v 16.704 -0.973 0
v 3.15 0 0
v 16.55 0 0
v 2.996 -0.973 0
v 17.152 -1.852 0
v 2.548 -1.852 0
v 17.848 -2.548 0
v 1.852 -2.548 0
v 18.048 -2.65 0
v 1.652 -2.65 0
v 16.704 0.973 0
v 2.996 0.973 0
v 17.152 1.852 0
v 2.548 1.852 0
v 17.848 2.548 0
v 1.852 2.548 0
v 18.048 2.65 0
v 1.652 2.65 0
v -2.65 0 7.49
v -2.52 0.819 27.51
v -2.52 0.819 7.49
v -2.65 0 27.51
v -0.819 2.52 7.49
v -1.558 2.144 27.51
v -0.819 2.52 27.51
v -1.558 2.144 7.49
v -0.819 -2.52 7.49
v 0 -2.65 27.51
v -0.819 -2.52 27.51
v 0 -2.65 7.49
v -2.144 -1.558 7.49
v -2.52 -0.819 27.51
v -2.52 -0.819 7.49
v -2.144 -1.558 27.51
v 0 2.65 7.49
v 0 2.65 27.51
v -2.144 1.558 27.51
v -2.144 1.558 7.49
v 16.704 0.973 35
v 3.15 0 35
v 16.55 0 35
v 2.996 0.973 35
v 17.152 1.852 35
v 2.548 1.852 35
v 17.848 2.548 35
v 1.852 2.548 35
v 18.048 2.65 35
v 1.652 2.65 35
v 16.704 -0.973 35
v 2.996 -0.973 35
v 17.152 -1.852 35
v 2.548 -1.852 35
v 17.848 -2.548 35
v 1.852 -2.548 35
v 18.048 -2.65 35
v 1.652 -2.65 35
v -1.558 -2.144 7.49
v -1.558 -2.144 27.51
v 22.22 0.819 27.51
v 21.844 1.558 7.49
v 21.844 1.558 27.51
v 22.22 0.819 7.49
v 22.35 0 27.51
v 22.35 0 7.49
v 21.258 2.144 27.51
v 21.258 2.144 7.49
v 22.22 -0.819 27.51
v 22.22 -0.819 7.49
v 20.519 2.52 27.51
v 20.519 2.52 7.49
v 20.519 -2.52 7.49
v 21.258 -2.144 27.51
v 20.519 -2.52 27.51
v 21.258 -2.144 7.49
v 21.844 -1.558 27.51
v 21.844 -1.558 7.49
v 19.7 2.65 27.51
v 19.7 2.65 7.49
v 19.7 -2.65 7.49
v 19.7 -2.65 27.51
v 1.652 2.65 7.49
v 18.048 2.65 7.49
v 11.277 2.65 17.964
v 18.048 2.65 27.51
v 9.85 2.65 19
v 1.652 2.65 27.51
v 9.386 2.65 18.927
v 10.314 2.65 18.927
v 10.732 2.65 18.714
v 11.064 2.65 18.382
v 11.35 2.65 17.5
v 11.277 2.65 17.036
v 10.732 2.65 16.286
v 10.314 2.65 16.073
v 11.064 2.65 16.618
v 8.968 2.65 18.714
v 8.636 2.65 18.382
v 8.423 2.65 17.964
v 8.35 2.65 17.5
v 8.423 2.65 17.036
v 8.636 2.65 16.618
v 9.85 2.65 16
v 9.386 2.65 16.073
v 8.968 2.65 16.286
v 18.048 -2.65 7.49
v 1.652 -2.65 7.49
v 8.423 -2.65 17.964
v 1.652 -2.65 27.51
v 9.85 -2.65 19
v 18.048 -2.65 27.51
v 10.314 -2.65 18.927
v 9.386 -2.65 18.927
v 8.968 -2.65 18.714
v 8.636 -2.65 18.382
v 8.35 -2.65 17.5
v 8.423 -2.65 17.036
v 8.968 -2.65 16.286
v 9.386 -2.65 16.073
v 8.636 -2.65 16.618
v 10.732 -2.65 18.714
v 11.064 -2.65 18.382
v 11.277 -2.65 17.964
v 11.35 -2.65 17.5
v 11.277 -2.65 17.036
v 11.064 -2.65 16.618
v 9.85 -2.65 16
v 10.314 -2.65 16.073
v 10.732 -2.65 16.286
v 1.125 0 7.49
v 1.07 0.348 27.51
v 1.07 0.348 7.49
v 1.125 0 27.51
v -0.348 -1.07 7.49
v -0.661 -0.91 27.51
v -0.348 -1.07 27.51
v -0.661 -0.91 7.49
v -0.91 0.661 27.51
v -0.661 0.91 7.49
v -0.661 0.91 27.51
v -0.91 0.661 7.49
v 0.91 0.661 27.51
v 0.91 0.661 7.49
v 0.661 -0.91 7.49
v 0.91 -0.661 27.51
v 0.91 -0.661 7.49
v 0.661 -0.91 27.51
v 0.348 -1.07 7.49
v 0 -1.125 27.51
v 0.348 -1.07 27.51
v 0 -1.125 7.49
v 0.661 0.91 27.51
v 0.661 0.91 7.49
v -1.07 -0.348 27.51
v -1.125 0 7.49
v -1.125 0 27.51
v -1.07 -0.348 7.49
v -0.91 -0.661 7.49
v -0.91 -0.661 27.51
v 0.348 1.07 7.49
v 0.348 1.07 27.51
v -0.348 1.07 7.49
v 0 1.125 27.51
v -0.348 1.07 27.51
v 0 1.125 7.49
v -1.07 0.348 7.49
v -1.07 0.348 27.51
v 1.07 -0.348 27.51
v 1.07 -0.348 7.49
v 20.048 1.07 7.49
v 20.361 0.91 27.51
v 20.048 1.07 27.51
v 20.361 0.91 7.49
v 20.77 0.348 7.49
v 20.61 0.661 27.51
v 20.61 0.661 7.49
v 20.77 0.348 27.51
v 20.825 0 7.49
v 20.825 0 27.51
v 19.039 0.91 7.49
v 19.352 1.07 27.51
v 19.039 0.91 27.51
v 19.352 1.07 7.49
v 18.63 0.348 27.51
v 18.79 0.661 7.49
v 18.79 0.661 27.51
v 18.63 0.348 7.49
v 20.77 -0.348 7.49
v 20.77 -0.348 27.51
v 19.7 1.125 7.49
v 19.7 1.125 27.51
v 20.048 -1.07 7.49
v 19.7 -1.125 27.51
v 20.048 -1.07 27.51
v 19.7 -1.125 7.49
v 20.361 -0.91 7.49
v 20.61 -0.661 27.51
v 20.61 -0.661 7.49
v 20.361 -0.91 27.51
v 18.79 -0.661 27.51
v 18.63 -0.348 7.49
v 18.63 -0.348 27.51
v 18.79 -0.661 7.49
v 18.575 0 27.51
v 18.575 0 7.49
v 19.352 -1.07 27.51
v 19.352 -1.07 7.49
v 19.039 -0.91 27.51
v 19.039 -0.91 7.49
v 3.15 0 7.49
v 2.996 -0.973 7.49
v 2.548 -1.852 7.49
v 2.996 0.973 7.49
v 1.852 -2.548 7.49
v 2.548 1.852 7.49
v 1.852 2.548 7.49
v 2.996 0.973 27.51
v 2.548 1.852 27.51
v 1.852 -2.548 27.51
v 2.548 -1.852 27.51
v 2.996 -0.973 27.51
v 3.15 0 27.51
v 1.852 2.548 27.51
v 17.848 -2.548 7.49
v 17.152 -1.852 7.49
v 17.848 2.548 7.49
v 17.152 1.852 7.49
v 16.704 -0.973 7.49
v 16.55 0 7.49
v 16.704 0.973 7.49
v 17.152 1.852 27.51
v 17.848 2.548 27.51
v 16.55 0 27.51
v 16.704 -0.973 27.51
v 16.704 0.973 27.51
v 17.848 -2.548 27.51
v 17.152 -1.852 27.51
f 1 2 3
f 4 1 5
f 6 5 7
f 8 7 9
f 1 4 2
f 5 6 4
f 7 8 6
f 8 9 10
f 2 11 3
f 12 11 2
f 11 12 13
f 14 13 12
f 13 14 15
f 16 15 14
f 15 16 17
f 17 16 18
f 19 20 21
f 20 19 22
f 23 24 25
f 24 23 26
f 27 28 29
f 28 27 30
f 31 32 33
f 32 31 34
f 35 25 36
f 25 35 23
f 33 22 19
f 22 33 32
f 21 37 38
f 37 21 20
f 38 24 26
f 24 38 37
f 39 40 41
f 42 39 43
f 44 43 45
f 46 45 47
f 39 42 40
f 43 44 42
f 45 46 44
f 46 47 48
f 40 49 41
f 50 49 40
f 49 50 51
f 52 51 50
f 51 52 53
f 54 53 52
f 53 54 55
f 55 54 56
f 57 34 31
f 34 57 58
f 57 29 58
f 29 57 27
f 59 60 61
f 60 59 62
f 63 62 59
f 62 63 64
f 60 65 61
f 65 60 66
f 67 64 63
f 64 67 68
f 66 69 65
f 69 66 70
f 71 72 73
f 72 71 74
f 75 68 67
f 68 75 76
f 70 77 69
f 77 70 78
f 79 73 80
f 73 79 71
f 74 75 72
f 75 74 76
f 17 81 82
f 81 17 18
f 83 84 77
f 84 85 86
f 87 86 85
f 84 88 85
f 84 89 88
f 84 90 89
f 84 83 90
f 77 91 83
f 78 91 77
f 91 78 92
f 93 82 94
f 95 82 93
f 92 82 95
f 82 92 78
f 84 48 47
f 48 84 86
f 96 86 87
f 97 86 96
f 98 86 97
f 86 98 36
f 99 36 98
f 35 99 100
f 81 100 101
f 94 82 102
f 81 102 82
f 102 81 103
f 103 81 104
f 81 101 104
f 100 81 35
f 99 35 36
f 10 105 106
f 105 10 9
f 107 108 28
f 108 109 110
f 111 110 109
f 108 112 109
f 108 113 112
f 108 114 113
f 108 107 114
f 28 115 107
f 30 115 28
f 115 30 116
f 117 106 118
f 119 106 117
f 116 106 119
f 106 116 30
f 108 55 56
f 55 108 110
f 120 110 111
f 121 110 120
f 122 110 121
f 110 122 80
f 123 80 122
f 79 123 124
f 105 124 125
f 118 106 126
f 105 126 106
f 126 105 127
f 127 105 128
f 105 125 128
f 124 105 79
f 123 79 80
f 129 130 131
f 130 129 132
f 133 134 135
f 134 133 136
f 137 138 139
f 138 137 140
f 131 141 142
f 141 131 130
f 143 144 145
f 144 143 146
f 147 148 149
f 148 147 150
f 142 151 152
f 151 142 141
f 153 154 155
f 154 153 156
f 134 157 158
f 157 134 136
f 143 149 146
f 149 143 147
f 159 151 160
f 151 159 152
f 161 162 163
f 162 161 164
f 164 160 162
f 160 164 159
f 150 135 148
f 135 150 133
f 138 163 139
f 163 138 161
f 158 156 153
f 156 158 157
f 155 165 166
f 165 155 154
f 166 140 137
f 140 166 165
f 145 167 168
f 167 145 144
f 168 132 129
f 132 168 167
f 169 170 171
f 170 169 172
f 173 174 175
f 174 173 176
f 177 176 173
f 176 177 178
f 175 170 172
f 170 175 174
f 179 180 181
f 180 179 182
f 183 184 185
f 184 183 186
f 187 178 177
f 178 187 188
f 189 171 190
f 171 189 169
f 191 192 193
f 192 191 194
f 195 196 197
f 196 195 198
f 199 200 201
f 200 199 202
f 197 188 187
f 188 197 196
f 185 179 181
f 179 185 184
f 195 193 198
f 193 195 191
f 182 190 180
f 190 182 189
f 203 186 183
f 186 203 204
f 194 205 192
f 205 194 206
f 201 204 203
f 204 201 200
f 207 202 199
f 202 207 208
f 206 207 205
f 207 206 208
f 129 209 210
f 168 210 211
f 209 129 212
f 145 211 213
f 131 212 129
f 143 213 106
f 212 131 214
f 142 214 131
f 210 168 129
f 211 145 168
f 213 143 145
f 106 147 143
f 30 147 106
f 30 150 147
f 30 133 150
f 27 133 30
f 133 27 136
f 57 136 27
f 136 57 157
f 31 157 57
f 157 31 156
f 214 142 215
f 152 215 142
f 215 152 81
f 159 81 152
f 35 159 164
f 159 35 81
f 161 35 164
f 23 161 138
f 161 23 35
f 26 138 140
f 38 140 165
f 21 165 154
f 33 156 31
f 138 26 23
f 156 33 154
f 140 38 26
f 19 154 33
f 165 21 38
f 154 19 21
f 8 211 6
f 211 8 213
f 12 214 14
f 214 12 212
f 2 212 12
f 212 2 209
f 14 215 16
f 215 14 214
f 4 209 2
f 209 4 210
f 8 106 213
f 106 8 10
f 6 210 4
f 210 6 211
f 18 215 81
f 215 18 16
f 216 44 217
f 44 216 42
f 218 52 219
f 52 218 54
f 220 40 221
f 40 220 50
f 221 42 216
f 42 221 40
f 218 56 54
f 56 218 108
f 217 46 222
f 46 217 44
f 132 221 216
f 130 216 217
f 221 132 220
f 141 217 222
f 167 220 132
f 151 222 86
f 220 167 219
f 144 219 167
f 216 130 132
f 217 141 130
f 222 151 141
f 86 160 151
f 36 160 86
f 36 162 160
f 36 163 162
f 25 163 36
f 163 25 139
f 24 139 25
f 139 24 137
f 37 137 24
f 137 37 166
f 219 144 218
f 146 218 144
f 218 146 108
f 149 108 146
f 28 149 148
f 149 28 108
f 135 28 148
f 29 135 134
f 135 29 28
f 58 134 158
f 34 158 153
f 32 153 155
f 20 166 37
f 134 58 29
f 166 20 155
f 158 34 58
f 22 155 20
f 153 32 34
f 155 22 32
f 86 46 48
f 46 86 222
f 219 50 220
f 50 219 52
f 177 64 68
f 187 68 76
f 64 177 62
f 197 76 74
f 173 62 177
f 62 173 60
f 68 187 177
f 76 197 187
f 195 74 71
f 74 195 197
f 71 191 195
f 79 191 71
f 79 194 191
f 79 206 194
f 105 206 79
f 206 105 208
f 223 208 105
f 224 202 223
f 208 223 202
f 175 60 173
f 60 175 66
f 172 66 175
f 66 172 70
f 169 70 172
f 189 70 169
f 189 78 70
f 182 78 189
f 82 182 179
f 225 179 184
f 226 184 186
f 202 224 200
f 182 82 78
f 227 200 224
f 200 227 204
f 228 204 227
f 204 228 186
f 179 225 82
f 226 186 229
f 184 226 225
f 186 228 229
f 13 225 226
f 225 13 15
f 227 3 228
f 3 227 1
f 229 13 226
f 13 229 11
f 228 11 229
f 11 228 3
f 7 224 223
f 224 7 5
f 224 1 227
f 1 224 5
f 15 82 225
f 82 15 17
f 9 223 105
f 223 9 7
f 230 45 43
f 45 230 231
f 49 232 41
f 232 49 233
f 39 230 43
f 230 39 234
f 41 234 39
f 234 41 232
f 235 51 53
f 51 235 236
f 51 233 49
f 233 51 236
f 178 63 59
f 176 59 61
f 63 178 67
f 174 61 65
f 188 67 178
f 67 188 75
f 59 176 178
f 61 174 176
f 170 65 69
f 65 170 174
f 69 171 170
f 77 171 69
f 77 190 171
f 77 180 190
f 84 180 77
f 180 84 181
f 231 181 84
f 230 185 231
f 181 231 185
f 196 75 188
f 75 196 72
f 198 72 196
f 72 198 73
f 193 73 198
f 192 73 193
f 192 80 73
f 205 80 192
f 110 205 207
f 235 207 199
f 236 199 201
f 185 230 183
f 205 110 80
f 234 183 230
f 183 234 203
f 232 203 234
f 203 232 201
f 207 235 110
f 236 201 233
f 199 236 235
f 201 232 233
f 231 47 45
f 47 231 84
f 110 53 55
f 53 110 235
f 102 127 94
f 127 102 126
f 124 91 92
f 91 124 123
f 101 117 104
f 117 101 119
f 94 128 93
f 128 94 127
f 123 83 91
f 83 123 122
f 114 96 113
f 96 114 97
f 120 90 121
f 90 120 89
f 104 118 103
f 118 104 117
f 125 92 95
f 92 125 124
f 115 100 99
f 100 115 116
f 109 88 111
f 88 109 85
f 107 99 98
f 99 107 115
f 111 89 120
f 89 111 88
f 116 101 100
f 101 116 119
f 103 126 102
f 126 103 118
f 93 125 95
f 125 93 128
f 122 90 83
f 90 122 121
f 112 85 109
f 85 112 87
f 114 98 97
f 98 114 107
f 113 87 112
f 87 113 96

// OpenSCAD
// file: cross.scad
include <belt_configuration.scad>

module cross()
{
  difference()
  {
    union()
    {
      cylinder(r=belt_thickness / 2, h=belt_height);

      translate([cross_width - belt_thickness,0,0])
        cylinder(r=belt_thickness / 2, h=belt_height);

      translate([0, -belt_thickness / 2, 0])
        cube([cross_width-belt_thickness, belt_thickness, belt_height]);
    }

    translate([0,0,-mo])
      cylinder(r=(pin_diameter +pin_tolerance)/ 2 , h=belt_height + 2 * mo);


    translate([cross_width - belt_thickness,0,-mo])
      cylinder(r=(pin_diameter +pin_tolerance) / 2, h=belt_height + 2 * mo);

    translate([-belt_thickness / 2, -belt_thickness / 2 - mo, -mo])
      cube([link_depth-pin_diameter/4, belt_thickness + 2* mo, (belt_height - link_depth_height) / 2]);
    translate([0,0,-mo])
      cylinder(r=(belt_thickness+link_tolerance) / 2, h=(belt_height - link_depth_height) / 2);

    translate([-belt_thickness / 2, -belt_thickness / 2 - mo, belt_height - (belt_height - link_depth_height) / 2+mo])
      cube([link_depth-pin_diameter/4, belt_thickness + 2* mo, belt_height - link_depth_height * 2]);
    translate([0,0,belt_height - (belt_height - link_depth_height) / 2+mo])
      cylinder(r=(belt_thickness+link_tolerance) / 2, h=(belt_height - link_depth_height) / 2);

    translate([cross_width - link_depth+pin_diameter/4 - belt_thickness / 2, -belt_thickness / 2 - mo, -mo])
      cube([link_depth-pin_diameter/4, belt_thickness + 2* mo, (belt_height - link_depth_height) / 2]);
    translate([cross_width - belt_thickness,0,-mo])
      cylinder(r=(belt_thickness+link_tolerance) / 2, h=(belt_height - link_depth_height) / 2);

    translate([cross_width - link_depth+pin_diameter/4 - belt_thickness / 2, -belt_thickness / 2 - mo, belt_height - (belt_height - link_depth_height) / 2+mo])
      cube([link_depth-pin_diameter/4, belt_thickness + 2* mo, belt_height - link_depth_height * 2]);
    translate([cross_width - belt_thickness,0,belt_height - (belt_height - link_depth_height) / 2+mo])
      cylinder(r=(belt_thickness+link_tolerance) / 2, h=(belt_height - link_depth_height) / 2);
  }
}

cross();
// file: belt_configuration.scad
belt_thickness = 5.3;
belt_height = 35;
buckle_thickness = 2;
buckle_length = 30;

$fn = 20;

cross_width = 25;
h_width = 25;
peak_width = 10;

link_height = 20;

pin_diameter = 2.05;

pin_tolerance = 0.2;

hole_diameter = 3;

mo = 0.01;


link_tolerance = 1;
link_depth = pin_diameter + 2*link_tolerance;
link_depth_height = 20;

tolerance = 1;
// main file
include <belt_configuration.scad>

use <cross.scad>
    
module cross_hole()
{
	difference()
   {
		cross();
      translate([cross_width/2-belt_thickness / 2,-belt_thickness/2-mo,belt_height/2])
		rotate([-90,0,0])
        cylinder(r=hole_diameter / 2, h=belt_thickness+2*mo);
   }
}

cross_hole();
